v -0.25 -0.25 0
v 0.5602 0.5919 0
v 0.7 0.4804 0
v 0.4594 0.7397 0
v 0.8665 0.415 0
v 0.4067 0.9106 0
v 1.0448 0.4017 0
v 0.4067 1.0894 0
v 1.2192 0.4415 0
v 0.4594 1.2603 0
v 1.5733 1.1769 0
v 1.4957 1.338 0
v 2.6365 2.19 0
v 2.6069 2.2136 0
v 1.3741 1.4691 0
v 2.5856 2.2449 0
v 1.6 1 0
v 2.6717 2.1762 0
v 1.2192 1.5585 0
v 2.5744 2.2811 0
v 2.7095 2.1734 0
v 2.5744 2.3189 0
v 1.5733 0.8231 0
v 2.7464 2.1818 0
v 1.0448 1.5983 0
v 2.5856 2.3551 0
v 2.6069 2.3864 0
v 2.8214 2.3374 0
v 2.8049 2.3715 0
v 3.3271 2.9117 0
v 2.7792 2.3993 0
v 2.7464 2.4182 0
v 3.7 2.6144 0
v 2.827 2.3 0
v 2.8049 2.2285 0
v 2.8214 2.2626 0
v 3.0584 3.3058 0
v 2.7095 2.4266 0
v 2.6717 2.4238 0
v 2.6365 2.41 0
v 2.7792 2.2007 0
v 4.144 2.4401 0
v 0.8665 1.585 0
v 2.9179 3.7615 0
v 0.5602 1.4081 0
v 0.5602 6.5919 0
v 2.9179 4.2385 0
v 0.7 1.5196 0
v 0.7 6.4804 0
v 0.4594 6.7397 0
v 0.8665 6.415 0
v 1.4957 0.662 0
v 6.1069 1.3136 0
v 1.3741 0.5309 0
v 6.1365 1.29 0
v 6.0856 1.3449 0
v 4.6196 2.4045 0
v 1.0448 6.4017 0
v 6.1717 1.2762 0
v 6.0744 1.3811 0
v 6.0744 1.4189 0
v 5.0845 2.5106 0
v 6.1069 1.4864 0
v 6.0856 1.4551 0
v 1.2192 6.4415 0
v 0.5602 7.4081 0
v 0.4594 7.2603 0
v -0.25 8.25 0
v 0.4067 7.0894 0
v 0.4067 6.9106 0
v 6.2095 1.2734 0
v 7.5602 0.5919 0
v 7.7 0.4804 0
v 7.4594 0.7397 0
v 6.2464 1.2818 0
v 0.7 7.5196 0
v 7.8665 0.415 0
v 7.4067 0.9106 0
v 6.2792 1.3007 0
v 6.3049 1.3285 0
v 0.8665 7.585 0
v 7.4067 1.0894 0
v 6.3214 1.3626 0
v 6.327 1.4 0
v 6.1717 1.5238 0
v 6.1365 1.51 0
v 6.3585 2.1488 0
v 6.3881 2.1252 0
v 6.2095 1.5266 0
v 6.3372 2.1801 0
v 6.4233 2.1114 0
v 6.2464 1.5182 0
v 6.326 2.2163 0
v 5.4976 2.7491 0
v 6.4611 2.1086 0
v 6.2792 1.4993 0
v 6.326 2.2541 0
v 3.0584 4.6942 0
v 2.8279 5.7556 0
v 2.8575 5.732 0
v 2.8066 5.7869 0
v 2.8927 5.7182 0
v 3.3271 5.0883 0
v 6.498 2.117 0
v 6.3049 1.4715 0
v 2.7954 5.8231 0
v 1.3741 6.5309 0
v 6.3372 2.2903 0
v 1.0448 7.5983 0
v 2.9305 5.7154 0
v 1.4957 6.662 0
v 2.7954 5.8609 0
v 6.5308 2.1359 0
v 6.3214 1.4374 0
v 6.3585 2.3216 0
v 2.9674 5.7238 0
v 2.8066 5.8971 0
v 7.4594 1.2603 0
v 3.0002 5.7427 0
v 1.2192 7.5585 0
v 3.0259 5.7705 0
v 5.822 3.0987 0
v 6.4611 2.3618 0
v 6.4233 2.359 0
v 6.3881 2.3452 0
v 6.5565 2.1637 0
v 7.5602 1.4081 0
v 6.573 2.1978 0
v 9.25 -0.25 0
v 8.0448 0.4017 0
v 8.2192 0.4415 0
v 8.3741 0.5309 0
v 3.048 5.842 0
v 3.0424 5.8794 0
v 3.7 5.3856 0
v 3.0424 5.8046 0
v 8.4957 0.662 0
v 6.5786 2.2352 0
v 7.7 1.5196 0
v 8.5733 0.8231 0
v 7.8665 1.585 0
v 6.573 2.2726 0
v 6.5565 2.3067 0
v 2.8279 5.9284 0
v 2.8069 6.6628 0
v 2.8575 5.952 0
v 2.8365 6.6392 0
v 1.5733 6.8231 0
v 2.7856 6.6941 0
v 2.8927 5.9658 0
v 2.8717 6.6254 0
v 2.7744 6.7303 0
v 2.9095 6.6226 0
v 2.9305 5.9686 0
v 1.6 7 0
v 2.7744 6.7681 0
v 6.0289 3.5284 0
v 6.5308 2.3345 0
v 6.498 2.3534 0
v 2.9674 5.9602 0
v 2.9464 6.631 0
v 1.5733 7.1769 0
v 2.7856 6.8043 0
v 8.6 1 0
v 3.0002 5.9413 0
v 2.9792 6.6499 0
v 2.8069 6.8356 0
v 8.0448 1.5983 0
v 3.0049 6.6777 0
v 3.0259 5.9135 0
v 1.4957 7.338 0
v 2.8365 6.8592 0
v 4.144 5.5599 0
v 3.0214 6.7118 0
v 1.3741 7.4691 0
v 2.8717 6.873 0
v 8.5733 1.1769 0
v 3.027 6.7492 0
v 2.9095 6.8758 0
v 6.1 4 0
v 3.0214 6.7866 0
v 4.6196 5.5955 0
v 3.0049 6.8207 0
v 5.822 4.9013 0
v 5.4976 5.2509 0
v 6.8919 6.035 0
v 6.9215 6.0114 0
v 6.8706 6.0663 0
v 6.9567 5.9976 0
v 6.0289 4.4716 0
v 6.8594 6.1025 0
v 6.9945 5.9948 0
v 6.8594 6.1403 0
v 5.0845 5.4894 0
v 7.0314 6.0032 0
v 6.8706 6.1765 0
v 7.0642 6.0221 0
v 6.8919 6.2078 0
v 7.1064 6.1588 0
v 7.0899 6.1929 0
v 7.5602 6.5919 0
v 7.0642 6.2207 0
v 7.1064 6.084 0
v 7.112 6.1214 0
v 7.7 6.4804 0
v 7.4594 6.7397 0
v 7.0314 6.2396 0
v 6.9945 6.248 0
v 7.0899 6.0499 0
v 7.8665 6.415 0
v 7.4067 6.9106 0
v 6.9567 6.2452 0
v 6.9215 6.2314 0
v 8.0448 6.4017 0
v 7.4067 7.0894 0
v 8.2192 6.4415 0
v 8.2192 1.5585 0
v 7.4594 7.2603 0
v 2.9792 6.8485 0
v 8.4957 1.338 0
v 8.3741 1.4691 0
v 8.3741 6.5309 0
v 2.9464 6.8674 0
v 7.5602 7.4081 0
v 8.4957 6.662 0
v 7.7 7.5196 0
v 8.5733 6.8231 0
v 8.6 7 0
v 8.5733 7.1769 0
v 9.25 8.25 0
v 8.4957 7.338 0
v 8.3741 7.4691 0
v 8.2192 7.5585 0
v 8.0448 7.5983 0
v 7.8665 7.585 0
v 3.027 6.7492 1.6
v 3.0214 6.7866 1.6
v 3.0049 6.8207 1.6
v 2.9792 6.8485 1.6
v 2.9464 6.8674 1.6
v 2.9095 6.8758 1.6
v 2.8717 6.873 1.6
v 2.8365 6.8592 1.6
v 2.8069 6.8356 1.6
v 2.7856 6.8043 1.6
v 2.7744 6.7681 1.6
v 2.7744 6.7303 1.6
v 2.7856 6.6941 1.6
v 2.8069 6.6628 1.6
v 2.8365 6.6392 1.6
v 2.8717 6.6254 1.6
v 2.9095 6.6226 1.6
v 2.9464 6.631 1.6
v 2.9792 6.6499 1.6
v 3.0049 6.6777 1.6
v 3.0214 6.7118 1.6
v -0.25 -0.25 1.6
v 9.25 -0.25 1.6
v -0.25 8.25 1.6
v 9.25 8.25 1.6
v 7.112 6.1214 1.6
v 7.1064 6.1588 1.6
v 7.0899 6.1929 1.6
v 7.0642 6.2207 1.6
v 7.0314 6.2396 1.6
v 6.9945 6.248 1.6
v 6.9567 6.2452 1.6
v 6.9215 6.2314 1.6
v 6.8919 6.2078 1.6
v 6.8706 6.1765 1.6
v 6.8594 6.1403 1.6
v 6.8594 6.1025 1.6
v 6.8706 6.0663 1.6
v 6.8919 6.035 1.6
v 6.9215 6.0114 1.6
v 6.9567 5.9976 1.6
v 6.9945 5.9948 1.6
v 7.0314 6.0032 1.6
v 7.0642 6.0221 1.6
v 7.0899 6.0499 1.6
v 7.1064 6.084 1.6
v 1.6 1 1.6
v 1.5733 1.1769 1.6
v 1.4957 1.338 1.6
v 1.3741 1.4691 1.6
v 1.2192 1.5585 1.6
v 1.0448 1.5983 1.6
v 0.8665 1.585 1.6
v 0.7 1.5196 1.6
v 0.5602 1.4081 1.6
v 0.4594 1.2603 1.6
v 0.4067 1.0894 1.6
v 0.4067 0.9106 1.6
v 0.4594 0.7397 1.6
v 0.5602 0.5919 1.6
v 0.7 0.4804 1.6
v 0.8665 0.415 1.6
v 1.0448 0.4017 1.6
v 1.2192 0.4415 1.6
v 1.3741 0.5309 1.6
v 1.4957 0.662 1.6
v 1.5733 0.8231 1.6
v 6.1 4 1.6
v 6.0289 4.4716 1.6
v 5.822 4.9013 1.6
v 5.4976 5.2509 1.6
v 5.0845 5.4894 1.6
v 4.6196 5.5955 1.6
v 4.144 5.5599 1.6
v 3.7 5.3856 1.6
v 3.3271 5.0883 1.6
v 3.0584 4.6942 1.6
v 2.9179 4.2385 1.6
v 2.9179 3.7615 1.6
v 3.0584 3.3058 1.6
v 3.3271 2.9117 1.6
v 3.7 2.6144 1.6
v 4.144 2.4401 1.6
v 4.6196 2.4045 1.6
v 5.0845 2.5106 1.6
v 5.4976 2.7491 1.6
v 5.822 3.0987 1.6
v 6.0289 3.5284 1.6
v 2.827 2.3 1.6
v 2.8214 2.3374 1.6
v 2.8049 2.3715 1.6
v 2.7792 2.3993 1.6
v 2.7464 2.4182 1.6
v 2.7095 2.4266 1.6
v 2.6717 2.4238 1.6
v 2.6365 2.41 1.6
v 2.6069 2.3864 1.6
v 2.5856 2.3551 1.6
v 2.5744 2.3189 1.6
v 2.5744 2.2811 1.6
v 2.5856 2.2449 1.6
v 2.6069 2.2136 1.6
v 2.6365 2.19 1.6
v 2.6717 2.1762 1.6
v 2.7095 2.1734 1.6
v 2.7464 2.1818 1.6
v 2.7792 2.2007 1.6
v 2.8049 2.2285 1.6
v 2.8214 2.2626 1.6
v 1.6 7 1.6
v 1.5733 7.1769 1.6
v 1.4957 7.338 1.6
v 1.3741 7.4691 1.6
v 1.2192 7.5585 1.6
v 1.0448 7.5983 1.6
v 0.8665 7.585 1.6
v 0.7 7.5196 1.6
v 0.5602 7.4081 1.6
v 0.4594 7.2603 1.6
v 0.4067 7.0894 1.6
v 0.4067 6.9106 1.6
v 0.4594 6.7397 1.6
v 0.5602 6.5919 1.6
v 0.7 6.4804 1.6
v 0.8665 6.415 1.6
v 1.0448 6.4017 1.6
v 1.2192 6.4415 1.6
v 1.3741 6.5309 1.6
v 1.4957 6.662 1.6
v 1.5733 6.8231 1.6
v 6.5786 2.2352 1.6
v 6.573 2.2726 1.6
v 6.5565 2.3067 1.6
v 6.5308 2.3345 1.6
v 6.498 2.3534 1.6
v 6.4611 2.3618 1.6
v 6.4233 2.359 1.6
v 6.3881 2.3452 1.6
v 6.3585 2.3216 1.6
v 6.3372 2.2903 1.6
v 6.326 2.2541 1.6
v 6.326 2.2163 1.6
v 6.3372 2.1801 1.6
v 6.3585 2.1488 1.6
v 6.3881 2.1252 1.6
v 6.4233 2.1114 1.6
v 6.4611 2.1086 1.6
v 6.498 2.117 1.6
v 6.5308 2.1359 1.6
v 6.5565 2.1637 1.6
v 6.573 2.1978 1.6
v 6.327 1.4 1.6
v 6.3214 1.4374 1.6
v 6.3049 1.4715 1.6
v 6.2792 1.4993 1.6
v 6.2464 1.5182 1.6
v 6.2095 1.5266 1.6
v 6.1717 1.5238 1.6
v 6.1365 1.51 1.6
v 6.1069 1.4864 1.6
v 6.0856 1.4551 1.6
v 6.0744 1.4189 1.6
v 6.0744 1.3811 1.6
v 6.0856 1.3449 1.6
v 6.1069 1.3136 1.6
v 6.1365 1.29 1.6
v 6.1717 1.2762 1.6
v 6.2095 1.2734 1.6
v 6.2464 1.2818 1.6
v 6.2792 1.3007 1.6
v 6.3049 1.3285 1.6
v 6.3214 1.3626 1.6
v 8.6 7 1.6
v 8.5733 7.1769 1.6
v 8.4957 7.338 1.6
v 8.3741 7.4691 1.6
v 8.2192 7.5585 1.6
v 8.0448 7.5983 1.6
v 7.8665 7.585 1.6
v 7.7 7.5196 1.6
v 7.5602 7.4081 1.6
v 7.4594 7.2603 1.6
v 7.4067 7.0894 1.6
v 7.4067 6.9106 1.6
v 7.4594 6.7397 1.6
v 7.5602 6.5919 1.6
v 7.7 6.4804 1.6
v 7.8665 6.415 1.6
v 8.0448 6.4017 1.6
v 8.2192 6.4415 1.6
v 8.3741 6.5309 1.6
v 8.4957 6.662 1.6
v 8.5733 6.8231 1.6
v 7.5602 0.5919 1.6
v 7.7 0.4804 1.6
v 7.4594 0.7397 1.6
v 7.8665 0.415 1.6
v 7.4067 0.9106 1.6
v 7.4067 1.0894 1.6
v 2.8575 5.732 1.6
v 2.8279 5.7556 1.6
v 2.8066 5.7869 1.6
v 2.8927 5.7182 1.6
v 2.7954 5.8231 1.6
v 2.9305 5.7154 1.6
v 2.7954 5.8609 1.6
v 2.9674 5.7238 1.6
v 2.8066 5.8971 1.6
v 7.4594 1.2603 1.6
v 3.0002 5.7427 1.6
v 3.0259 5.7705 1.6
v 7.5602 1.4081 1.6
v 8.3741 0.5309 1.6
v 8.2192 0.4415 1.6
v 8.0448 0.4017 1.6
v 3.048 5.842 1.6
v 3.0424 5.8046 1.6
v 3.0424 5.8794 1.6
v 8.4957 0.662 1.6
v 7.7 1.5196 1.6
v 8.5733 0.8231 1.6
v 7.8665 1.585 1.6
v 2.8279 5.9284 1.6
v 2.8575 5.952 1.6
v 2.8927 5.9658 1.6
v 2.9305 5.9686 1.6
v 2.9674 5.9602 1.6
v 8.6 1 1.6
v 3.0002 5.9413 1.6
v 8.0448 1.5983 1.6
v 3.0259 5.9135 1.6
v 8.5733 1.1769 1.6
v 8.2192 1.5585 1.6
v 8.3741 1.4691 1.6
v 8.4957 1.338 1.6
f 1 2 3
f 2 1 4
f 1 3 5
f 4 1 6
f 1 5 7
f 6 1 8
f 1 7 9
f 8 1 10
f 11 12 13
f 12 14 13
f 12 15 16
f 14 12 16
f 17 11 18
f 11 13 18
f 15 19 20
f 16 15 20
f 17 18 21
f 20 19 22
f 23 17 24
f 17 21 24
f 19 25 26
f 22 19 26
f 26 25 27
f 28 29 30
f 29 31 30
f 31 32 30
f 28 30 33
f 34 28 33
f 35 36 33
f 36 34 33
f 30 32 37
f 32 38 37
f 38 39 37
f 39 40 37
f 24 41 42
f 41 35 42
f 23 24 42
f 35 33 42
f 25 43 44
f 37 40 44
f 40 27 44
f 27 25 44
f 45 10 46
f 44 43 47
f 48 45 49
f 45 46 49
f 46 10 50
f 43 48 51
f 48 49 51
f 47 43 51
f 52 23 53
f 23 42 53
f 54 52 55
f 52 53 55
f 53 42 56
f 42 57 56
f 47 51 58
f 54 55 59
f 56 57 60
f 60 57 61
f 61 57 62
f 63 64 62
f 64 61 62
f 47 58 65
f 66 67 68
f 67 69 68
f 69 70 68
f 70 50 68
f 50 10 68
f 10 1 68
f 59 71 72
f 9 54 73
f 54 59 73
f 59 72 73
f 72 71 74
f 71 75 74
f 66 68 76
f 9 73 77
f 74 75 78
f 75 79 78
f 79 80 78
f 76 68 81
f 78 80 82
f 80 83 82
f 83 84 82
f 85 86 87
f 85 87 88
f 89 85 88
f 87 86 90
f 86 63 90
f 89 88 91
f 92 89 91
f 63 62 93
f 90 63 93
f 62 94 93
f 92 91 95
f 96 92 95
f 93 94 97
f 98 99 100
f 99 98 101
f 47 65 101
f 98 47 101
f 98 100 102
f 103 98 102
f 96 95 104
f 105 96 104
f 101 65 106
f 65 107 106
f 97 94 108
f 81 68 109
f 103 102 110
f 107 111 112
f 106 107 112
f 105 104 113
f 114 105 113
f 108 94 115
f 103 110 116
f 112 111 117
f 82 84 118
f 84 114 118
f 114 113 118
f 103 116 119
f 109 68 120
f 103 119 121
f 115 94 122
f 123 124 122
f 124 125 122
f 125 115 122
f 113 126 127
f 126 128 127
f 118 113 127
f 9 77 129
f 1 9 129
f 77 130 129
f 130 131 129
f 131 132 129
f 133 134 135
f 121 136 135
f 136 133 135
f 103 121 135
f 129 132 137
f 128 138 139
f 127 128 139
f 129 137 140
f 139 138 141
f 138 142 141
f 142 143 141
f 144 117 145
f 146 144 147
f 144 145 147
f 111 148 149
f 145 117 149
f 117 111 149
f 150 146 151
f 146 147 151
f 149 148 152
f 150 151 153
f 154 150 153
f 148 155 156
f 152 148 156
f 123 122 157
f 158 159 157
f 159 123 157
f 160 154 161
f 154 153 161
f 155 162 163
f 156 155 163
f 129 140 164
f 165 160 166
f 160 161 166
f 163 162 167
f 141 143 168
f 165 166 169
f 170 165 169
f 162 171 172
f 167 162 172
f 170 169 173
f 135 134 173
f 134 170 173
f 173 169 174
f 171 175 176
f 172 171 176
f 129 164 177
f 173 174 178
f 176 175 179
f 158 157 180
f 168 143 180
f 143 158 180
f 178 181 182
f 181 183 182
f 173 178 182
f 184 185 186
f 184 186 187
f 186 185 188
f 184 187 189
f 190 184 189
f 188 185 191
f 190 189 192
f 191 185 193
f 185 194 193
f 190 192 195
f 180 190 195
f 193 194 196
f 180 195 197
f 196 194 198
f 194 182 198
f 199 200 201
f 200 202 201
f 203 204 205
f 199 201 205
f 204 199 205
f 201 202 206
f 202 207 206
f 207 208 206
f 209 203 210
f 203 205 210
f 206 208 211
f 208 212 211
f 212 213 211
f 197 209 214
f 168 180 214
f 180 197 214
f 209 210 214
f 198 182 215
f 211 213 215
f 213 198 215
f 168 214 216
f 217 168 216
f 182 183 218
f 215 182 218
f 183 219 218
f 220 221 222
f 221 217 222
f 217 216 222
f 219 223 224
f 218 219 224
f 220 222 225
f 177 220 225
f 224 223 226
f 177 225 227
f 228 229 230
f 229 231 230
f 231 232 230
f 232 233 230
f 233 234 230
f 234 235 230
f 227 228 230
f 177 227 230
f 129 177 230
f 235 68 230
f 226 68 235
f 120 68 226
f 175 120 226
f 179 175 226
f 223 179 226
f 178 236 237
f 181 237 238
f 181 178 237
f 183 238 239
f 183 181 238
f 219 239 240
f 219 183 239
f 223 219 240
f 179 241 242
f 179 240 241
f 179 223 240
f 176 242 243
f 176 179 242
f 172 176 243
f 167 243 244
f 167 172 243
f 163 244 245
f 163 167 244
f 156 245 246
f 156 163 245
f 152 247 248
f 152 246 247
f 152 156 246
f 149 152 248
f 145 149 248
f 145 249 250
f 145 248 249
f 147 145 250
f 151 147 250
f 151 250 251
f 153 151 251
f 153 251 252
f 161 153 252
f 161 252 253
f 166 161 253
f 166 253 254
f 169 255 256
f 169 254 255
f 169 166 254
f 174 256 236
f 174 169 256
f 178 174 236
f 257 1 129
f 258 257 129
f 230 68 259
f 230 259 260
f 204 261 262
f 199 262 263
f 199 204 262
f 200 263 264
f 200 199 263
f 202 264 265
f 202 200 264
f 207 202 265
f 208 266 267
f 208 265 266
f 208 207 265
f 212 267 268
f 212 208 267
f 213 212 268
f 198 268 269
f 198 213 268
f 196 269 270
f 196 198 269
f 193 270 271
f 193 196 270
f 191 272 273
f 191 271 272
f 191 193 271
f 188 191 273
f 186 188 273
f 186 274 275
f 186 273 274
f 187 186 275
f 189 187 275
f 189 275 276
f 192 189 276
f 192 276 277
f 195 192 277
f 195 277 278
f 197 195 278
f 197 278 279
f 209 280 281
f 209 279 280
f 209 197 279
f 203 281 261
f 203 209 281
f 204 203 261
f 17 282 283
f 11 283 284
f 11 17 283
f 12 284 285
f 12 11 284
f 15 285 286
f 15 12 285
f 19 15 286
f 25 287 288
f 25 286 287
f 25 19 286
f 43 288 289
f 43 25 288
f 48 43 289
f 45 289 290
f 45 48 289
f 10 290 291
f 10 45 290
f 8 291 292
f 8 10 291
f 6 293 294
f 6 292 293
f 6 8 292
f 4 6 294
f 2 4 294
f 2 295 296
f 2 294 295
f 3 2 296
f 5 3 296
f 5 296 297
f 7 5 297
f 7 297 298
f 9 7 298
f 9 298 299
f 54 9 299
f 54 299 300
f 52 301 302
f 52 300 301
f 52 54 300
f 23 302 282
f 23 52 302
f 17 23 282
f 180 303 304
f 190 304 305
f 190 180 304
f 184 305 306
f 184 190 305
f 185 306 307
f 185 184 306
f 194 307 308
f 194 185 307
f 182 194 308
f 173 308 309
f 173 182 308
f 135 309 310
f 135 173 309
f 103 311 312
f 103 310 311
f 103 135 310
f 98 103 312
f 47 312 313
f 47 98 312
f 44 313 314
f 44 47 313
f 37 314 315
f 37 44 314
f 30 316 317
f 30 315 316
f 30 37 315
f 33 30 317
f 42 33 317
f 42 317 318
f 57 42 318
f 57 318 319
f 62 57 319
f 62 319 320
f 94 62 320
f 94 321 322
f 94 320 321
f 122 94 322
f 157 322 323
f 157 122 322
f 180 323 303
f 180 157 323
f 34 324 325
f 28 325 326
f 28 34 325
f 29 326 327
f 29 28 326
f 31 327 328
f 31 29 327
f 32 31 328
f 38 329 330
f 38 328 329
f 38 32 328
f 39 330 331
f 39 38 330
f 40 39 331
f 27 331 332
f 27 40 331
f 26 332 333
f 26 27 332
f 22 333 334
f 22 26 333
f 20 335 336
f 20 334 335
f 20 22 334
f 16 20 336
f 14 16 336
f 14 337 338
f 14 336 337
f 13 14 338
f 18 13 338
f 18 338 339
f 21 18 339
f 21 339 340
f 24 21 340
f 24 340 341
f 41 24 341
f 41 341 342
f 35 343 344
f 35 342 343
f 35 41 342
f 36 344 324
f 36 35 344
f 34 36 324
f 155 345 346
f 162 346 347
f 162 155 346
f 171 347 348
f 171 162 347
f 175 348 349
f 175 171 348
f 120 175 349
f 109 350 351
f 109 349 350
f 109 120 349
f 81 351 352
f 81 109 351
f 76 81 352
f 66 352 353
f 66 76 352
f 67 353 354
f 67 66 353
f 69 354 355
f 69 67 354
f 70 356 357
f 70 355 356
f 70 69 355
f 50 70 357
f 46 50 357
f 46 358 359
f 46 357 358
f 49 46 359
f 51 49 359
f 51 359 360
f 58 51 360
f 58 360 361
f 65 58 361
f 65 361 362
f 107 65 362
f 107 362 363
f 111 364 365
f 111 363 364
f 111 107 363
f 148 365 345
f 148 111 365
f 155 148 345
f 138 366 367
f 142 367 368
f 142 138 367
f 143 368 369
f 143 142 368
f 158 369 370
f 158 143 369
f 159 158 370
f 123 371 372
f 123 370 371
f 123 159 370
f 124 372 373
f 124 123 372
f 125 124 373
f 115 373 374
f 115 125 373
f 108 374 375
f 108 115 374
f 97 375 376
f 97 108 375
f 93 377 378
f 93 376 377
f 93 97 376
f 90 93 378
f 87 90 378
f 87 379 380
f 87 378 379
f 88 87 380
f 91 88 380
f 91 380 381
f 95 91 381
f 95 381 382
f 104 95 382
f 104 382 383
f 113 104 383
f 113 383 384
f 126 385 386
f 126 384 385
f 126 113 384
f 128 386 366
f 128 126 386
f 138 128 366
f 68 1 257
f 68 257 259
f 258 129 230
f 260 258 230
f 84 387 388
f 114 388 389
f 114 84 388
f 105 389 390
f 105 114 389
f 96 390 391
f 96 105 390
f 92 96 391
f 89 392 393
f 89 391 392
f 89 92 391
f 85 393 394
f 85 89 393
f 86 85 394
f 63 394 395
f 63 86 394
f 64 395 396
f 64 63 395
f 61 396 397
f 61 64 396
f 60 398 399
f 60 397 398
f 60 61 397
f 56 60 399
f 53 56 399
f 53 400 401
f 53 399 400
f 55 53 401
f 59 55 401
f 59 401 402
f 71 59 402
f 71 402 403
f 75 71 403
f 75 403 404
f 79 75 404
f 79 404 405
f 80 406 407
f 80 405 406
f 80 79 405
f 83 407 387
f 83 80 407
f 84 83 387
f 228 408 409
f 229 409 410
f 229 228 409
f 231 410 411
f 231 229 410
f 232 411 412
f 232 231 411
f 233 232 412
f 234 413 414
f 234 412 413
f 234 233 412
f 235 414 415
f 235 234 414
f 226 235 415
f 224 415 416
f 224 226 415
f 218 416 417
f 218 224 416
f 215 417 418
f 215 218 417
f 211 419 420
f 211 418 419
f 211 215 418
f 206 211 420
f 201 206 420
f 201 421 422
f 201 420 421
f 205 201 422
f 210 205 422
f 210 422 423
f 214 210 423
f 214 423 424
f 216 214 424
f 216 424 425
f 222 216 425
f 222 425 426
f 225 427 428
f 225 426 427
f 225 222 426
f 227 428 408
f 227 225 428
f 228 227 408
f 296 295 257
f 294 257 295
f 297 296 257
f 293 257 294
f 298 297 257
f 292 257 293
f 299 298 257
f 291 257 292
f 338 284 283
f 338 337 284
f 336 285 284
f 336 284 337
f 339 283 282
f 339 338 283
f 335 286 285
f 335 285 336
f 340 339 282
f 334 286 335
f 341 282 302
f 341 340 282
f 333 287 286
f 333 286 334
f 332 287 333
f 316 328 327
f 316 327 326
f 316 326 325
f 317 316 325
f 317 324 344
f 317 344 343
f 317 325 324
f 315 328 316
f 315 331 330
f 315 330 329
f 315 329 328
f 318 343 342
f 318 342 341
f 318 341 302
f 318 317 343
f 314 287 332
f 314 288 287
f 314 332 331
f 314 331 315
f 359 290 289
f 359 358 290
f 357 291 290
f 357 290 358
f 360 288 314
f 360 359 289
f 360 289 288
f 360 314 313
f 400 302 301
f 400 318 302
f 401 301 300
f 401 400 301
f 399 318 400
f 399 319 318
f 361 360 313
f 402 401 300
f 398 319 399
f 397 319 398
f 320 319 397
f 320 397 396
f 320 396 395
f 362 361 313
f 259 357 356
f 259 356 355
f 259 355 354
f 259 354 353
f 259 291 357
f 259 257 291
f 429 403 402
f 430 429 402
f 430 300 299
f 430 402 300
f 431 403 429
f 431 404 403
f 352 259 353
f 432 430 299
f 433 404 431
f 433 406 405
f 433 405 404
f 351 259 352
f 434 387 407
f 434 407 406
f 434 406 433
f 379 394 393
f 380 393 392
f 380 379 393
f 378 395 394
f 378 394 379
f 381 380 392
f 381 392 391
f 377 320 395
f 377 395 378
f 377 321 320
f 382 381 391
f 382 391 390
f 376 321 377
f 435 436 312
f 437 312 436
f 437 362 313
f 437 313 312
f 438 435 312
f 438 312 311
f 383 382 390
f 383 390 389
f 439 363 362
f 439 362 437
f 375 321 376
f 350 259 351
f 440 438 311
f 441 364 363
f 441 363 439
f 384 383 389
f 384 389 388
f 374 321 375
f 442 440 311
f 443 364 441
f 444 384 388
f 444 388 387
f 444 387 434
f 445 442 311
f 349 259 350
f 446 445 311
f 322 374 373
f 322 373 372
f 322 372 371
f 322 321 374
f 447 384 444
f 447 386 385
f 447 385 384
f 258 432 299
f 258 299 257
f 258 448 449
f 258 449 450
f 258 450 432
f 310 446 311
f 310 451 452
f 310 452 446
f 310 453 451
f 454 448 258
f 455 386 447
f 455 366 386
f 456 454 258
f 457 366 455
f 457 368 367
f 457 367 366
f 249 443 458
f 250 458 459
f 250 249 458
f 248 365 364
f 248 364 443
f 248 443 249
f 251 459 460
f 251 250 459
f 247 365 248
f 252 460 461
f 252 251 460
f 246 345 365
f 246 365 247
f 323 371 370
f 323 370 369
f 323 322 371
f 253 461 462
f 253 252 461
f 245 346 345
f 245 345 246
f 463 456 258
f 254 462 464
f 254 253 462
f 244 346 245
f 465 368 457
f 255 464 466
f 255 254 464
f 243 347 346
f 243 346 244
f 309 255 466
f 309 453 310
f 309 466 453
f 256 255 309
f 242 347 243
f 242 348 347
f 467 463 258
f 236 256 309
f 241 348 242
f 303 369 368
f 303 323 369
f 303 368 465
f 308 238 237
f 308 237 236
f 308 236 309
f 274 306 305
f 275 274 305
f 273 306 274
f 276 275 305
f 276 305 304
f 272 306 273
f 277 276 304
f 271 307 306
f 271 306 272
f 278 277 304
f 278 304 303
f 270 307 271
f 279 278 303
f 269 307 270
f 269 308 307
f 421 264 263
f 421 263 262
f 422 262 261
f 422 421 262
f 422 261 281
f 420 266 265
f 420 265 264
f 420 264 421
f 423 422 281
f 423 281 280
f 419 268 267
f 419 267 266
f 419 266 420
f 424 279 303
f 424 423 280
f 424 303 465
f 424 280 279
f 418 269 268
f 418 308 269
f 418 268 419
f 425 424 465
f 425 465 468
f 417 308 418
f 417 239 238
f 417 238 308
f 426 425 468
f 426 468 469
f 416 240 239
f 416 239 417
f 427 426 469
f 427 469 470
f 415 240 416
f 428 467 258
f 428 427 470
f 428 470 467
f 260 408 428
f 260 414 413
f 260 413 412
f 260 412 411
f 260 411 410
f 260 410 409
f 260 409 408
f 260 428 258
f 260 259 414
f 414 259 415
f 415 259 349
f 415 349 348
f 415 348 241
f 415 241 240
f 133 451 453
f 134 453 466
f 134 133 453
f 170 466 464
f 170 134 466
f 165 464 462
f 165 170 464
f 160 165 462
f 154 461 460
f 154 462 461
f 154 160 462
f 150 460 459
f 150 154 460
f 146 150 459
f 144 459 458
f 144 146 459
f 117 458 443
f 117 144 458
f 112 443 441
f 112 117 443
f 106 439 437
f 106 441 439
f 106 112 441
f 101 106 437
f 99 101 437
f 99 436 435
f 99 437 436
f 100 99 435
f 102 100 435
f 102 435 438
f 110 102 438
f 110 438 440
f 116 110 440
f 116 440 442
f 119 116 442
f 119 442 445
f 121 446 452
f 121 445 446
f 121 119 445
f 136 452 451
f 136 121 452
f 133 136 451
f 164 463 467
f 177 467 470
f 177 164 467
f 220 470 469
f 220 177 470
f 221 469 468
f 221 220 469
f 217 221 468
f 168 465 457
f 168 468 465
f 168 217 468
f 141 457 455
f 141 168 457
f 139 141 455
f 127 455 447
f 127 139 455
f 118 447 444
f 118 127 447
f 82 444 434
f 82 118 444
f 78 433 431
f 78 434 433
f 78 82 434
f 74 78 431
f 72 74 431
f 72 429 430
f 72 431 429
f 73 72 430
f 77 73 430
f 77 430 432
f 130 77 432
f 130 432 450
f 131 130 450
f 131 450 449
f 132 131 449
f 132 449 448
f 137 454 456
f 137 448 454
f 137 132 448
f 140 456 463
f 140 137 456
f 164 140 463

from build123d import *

# Parameters (mm, degrees)
SKETCH1_W           = 9.5
SKETCH1_H           = 8.5
BOARD_OUTLINE_DEPTH = 1.6
SKETCH2_R           = 0.6
SKETCH2_R_2         = 1.6
SKETCH2_R_3         = 0.127
NPTH_DEPTH          = 13.49739973


with BuildPart() as part:
    # Sketch1 → Board_Outline (new body)
    with BuildSketch(Plane.XY):
        with Locations((4.5, 4)):
            Rectangle(SKETCH1_W, SKETCH1_H)
    extrude(amount=BOARD_OUTLINE_DEPTH)

    # Sketch2 → NPTH (cut, through all)
    with BuildSketch(Plane.XY):
        with Locations((8, 7)):
            Circle(SKETCH2_R)
        with Locations((1, 7)):
            Circle(SKETCH2_R)
        with Locations((1, 1)):
            Circle(SKETCH2_R)
        with Locations((8, 1)):
            Circle(SKETCH2_R)
        with Locations((4.5, 4)):
            Circle(SKETCH2_R_2)
        with Locations((2.7, 2.3)):
            Circle(SKETCH2_R_3)
        with Locations((6.2, 1.4)):
            Circle(SKETCH2_R_3)
        with Locations((2.9, 6.7492)):
            Circle(SKETCH2_R_3)
        with Locations((2.921, 5.842)):
            Circle(SKETCH2_R_3)
        with Locations((6.4516, 2.2352)):
            Circle(SKETCH2_R_3)
        with Locations((6.985, 6.1214)):
            Circle(SKETCH2_R_3)
    extrude(amount=NPTH_DEPTH, mode=Mode.SUBTRACT)


solid = part.part
